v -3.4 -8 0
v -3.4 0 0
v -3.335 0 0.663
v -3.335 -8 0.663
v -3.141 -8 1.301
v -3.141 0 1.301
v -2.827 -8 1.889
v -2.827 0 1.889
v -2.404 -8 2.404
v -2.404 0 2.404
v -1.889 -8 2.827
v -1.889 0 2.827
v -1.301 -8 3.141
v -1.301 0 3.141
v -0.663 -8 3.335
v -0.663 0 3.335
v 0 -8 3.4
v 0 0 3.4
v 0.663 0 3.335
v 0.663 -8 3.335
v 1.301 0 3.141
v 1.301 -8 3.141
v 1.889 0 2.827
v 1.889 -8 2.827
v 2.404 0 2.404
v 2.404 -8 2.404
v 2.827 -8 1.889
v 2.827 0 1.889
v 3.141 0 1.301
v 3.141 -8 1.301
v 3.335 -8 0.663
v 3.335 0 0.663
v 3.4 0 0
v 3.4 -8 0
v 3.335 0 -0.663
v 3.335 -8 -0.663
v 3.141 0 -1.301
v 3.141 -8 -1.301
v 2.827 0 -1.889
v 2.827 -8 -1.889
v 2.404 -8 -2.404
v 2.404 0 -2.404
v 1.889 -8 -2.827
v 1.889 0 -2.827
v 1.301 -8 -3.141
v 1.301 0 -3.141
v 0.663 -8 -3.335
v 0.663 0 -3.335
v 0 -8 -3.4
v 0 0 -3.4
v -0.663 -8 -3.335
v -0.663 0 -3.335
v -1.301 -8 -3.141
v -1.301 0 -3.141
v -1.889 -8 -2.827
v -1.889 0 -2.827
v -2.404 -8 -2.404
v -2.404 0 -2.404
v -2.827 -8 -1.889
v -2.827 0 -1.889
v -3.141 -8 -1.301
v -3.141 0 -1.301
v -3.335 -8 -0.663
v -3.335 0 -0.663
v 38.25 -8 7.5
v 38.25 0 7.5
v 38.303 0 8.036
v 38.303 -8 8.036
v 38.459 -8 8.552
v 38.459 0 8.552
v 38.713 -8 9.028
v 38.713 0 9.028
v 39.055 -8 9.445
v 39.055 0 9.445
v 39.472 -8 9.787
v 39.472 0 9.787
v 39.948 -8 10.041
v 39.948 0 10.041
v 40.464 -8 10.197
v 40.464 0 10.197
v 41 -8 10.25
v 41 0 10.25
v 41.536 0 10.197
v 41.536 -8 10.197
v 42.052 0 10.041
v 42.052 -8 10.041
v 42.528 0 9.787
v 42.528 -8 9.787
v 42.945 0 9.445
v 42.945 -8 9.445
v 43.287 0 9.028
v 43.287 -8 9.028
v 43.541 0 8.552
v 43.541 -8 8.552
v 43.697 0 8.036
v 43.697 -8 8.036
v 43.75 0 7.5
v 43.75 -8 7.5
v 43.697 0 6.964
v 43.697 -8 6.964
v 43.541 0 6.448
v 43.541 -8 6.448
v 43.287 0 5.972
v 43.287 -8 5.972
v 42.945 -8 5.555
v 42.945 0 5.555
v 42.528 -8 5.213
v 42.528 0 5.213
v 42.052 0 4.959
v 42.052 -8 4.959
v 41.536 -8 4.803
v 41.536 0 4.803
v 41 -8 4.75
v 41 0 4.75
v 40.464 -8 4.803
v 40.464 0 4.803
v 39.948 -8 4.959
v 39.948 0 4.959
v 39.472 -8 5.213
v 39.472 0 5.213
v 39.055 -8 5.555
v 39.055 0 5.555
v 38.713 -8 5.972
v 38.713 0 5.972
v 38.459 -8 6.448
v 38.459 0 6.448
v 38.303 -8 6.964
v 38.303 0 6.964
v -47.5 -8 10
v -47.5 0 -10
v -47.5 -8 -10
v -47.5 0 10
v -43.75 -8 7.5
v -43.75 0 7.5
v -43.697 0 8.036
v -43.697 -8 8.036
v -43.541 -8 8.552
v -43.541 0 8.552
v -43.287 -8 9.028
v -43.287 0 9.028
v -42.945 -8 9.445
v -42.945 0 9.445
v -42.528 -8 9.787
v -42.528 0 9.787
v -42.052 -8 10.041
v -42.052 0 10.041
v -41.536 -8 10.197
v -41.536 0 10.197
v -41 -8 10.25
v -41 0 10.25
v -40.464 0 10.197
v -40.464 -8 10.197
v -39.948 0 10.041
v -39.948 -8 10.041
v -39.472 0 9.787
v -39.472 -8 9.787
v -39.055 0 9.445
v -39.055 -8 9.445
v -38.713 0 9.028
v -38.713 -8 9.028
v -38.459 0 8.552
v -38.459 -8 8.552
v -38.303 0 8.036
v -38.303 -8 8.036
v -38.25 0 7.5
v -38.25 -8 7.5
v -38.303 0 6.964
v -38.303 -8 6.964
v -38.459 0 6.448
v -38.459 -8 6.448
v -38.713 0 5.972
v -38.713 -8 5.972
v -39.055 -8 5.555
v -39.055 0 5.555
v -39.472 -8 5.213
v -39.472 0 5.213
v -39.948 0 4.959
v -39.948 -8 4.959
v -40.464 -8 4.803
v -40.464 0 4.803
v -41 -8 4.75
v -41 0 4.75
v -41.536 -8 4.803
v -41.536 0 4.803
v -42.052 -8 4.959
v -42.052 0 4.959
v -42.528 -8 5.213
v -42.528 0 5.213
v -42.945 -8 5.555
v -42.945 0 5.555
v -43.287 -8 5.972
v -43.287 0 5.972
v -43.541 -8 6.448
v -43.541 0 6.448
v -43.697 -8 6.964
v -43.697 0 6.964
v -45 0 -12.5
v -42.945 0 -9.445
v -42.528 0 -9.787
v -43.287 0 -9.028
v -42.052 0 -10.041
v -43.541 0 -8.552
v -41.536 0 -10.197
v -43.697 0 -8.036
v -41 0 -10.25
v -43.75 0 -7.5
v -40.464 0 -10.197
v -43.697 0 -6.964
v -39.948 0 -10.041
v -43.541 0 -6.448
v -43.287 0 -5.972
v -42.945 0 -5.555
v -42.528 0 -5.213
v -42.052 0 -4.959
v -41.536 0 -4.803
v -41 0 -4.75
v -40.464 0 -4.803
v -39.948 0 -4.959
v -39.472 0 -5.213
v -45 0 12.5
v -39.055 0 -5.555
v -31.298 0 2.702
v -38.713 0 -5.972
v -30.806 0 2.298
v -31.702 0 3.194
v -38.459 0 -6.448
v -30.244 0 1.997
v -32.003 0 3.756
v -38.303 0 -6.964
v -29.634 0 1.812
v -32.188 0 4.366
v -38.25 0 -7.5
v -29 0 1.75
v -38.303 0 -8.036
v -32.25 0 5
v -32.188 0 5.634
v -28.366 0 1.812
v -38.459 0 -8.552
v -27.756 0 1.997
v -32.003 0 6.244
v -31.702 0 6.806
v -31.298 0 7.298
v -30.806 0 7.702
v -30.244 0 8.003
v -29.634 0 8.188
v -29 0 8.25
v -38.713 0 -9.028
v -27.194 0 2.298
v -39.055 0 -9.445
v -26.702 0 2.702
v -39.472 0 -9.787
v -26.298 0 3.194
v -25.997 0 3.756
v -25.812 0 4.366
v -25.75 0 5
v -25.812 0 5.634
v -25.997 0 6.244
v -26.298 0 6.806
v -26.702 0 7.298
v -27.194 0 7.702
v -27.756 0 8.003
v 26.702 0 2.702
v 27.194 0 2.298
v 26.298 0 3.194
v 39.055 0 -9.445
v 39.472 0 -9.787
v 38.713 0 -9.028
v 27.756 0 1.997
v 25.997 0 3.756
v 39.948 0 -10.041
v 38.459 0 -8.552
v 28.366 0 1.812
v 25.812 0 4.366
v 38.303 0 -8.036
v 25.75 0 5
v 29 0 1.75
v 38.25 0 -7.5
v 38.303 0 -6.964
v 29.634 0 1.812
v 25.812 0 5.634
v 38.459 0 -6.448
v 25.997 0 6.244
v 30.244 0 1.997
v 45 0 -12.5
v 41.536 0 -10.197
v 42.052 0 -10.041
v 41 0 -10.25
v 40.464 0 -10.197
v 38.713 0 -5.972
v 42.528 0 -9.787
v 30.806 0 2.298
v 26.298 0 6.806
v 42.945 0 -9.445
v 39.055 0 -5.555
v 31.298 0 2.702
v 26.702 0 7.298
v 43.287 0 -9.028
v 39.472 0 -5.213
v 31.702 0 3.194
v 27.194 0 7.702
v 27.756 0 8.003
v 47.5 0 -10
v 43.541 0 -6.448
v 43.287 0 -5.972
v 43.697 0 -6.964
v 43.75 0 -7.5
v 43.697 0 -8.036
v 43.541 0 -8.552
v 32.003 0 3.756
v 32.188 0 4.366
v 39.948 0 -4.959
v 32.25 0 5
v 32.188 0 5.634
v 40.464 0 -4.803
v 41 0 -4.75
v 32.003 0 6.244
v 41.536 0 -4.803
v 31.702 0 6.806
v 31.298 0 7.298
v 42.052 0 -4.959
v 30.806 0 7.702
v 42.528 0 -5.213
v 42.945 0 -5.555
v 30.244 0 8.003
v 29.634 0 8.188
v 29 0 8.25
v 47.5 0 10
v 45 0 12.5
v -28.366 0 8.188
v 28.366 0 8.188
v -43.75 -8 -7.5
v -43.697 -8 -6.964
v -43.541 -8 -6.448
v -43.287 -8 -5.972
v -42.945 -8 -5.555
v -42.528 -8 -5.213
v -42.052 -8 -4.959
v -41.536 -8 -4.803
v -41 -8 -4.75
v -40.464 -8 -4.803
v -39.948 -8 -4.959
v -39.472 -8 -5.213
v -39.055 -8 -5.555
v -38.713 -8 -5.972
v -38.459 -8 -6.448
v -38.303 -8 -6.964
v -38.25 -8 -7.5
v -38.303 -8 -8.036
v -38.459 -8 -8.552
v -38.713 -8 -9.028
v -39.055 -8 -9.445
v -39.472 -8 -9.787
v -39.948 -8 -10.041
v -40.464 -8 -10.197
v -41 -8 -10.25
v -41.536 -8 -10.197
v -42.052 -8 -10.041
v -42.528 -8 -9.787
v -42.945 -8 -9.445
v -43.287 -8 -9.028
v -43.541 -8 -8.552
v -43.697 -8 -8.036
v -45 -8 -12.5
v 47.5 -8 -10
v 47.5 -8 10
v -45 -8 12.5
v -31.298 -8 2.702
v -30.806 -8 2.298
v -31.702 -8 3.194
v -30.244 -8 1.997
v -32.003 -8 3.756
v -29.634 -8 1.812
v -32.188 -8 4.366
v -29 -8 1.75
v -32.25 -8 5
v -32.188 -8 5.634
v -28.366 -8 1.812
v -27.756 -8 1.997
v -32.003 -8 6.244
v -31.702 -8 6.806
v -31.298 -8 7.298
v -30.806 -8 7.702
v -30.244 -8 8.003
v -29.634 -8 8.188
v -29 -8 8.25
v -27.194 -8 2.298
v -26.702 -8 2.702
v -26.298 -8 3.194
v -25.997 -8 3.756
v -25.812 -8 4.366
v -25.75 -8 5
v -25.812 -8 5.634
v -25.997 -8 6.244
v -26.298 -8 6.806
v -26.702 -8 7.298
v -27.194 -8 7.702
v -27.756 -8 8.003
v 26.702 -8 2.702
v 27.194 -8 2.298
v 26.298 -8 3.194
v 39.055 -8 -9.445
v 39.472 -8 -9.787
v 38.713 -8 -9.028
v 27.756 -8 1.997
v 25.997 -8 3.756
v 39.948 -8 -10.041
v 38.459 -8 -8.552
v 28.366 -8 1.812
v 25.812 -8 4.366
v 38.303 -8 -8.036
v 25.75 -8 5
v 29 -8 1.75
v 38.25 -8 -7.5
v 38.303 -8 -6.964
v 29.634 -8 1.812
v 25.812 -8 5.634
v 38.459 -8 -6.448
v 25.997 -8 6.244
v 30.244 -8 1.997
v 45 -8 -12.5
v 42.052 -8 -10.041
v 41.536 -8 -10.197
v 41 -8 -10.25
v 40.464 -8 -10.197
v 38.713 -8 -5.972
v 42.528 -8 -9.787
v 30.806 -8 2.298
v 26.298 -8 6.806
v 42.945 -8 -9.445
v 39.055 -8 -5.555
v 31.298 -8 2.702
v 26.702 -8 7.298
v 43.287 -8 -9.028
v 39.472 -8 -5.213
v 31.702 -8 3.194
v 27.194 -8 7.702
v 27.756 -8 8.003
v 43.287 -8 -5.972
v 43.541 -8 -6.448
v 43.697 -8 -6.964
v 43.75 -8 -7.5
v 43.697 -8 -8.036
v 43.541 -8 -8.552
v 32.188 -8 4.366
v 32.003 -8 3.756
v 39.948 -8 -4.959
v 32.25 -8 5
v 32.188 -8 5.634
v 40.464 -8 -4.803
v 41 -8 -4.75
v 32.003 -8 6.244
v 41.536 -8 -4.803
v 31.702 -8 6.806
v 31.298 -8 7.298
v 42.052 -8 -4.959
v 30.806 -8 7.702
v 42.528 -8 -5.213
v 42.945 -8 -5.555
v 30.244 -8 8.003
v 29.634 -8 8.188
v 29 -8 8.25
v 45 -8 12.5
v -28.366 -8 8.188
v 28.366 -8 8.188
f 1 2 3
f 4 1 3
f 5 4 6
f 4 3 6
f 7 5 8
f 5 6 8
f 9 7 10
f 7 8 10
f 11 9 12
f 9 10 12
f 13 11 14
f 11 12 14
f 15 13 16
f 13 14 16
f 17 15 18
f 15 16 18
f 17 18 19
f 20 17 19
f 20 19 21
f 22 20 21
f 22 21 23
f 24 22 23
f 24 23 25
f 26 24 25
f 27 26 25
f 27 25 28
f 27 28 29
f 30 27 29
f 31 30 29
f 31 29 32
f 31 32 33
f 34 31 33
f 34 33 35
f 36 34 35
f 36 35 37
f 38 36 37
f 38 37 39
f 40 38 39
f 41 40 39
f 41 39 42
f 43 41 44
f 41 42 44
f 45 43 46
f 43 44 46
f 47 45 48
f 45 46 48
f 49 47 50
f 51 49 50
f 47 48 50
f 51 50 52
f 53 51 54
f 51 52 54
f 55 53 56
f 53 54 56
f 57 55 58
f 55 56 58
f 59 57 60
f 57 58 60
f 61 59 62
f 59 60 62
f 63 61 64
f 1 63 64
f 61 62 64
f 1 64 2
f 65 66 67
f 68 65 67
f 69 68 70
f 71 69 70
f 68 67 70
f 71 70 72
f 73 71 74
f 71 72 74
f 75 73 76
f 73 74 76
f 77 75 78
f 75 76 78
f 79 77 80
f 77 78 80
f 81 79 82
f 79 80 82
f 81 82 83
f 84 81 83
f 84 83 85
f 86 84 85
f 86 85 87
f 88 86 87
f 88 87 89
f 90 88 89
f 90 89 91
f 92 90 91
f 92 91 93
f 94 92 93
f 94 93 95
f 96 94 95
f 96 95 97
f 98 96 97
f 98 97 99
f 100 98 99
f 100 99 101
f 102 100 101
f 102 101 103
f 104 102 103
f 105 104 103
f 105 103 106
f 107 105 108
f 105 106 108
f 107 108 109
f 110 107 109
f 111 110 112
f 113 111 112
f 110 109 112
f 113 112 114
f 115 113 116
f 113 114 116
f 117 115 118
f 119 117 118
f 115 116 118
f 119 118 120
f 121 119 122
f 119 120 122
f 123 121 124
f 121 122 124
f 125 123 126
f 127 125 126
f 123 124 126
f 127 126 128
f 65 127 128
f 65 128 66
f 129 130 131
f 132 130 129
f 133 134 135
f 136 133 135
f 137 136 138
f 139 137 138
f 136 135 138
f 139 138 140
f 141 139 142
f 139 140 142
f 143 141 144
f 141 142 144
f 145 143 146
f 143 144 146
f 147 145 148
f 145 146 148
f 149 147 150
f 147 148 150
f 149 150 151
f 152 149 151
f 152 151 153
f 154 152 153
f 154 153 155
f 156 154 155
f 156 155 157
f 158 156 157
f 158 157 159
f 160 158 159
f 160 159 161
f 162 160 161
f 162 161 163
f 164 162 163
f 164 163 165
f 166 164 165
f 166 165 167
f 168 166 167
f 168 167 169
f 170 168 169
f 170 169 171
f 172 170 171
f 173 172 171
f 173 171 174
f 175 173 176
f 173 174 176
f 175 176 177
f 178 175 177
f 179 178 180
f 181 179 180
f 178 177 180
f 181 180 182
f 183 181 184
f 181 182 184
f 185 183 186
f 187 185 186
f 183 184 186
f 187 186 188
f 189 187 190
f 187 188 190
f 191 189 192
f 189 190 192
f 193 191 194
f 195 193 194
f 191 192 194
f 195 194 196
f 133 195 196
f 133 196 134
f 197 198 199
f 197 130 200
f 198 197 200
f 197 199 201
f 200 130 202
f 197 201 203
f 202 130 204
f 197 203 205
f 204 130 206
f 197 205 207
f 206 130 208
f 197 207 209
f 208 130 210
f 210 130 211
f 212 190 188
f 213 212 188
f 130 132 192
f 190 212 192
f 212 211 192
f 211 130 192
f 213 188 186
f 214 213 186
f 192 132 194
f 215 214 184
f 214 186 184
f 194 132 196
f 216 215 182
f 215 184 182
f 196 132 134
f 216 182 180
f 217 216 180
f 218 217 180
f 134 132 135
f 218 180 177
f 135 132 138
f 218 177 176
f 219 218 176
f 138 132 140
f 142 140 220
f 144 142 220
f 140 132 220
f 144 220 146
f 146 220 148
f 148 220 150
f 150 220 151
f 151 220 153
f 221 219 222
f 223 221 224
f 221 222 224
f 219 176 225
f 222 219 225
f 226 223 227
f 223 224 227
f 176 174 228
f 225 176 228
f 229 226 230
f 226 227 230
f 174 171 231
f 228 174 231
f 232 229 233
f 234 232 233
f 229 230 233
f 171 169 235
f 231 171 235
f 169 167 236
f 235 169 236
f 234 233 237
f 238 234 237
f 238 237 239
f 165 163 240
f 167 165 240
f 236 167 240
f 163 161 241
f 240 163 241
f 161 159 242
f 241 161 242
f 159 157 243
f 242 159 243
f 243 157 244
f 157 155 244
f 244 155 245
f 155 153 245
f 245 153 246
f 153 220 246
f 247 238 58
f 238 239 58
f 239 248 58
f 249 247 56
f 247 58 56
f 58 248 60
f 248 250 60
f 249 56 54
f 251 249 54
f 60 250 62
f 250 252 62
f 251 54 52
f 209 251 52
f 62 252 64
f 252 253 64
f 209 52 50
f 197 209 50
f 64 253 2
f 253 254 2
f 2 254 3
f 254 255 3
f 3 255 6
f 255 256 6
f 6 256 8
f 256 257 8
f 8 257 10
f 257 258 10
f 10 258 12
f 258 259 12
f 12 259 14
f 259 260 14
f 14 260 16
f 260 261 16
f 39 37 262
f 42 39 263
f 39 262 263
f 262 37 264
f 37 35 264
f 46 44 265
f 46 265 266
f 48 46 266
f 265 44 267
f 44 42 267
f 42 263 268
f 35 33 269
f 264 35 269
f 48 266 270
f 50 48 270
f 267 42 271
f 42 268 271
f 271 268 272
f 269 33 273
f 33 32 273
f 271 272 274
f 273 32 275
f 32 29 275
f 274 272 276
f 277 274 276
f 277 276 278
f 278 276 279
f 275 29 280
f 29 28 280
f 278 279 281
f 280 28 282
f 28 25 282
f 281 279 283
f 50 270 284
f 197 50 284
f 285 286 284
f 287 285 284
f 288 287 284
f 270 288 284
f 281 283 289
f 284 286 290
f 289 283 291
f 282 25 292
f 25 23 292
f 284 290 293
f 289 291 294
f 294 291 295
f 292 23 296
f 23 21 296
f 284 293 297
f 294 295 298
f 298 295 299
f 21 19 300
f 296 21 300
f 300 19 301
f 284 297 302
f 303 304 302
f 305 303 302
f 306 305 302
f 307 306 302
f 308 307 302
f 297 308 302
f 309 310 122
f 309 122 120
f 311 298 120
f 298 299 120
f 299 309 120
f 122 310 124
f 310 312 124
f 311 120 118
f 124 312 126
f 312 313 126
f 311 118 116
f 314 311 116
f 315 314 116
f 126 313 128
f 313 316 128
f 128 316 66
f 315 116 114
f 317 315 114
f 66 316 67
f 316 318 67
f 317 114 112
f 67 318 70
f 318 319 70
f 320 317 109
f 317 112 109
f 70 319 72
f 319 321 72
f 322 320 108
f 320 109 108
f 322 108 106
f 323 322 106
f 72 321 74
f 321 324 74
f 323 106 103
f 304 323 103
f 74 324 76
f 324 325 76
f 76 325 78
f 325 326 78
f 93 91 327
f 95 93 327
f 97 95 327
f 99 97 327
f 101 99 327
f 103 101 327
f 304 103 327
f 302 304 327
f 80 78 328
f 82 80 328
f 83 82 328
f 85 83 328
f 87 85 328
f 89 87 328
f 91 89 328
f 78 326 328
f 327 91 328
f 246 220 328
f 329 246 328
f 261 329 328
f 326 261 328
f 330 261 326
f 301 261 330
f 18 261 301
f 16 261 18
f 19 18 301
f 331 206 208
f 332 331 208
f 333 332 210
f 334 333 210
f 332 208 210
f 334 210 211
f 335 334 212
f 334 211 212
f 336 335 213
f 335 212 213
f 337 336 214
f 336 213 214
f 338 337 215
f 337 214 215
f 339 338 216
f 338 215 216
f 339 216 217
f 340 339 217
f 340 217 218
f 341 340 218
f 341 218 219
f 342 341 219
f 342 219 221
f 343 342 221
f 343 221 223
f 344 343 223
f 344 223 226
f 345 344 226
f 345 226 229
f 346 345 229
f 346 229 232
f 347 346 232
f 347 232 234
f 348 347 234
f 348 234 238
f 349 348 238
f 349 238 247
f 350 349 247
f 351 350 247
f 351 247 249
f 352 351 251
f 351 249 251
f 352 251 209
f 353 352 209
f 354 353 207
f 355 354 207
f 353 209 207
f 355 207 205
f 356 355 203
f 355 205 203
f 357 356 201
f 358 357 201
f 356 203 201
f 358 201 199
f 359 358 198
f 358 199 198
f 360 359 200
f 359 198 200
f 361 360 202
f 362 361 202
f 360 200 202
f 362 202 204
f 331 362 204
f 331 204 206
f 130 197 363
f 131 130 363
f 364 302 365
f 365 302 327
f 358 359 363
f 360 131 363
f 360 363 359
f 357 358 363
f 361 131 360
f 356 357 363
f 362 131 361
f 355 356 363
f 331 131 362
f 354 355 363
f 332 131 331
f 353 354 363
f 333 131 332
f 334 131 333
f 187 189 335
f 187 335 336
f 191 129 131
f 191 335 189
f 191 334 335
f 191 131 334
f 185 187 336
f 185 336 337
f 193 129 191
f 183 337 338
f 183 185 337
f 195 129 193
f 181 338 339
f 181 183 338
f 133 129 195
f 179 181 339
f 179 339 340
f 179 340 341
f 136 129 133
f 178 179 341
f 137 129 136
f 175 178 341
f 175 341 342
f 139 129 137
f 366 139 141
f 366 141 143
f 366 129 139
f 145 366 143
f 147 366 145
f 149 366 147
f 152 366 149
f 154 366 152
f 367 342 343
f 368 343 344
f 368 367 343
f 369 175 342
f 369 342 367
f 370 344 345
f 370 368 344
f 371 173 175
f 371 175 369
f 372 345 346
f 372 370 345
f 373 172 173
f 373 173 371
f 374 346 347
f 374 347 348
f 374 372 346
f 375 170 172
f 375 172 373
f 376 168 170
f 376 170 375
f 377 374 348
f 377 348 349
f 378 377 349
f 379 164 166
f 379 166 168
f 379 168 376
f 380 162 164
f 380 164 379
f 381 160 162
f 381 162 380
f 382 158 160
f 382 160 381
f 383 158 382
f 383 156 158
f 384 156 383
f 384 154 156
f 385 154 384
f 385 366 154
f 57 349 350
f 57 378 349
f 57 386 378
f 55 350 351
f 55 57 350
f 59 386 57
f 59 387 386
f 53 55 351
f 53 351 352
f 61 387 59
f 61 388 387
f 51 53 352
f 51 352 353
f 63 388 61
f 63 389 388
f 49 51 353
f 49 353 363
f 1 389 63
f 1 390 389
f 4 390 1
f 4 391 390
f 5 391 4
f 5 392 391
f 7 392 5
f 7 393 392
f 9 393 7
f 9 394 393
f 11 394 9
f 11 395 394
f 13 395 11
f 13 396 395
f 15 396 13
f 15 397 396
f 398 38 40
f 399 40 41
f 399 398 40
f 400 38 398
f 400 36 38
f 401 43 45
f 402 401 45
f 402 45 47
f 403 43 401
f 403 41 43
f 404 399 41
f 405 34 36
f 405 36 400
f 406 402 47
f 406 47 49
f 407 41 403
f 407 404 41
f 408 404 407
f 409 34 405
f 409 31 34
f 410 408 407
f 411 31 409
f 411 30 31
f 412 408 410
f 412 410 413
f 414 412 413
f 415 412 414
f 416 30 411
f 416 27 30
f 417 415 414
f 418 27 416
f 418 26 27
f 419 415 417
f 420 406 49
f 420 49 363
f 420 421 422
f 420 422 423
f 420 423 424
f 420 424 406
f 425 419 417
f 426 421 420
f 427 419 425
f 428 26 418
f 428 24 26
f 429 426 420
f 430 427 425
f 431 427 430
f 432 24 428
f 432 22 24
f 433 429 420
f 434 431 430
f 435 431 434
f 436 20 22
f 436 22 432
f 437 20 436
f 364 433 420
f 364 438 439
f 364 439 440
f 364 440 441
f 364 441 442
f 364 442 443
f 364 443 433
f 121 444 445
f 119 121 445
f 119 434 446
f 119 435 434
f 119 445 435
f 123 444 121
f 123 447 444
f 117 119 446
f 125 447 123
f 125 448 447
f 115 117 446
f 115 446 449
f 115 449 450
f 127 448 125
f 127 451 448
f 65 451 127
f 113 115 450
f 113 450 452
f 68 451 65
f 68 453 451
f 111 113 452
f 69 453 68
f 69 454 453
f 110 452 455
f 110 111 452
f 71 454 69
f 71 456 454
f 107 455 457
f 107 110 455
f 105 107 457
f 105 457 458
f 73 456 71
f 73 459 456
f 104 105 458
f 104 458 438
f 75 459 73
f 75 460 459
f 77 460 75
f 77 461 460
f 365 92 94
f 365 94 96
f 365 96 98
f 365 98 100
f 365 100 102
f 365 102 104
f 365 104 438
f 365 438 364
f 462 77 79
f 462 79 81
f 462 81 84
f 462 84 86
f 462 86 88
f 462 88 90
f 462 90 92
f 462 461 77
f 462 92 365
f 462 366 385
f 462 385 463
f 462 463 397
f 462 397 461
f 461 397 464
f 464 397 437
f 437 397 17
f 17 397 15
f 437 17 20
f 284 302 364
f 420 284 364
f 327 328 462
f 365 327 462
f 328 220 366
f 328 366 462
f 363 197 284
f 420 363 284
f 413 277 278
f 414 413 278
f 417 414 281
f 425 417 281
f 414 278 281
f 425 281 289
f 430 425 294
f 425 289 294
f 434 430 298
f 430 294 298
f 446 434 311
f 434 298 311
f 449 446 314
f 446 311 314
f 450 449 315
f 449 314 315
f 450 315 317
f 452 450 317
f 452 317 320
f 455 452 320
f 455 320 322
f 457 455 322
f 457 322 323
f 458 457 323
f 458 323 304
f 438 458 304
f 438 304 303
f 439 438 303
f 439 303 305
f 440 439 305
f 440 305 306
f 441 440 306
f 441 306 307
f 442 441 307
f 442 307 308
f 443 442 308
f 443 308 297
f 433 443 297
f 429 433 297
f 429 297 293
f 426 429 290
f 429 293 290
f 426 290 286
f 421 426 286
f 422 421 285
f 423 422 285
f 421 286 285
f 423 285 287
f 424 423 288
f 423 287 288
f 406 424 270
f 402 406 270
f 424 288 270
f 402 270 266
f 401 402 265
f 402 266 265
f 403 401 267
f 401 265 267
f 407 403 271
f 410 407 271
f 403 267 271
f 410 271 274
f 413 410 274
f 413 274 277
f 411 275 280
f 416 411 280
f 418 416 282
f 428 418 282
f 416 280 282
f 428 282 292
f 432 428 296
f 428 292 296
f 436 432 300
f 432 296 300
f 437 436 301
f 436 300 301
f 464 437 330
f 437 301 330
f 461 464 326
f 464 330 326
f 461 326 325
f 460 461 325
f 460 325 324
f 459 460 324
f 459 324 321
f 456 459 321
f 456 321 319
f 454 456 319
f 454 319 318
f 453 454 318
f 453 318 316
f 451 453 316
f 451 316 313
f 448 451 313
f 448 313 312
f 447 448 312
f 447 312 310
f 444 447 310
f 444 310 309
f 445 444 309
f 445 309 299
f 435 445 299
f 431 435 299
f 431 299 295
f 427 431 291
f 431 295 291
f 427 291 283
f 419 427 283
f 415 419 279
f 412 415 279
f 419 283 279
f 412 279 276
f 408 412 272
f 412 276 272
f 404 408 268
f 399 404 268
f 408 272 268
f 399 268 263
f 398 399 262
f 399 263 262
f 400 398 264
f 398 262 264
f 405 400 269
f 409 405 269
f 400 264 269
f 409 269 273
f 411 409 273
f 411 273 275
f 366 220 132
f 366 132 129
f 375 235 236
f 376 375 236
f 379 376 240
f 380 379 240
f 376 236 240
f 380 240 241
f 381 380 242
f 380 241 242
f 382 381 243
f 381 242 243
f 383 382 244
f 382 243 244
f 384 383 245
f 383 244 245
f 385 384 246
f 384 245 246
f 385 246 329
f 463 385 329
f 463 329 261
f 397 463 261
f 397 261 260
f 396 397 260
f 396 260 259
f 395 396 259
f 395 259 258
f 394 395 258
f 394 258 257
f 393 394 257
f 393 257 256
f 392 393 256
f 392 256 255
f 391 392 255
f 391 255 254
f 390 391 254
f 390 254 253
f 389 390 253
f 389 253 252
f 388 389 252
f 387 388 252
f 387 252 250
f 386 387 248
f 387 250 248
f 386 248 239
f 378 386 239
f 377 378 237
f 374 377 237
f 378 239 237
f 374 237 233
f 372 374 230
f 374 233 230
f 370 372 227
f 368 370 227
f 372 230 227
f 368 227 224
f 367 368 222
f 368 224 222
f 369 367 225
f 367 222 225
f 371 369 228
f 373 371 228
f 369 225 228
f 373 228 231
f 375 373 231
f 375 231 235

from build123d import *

# Parameters (mm, degrees)
F0_W     = 95
F0_H     = 25
F1_DEPTH = 8
F2_SIZE  = 2.5
F4_D     = 5.5
F4_DEPTH = 10
F4_TIP   = 1.6523667023
F6_D     = 6.5
F6_DEPTH = 10
F6_TIP   = 1.9527970118
F7_D     = 6.8


with BuildPart() as f1:
    # F0 (on Front) → F1 (new body)
    with BuildSketch(Plane.XZ):
        Rectangle(F0_W, F0_H)
    extrude(amount=F1_DEPTH)

    # F2
    f2_edges = [f1.edges().sort_by_distance(p)[0] for p in [
        (47.5, -4, 12.5),
        (47.5, -4, -12.5),
        (-47.5, -4, 12.5),
        (-47.5, -4, -12.5),
    ]]
    chamfer(f2_edges, length=F2_SIZE)

    # F4
    with Locations(Plane.XZ.offset(8)):
        with Locations((-41, 7.5), (-41, -7.5), (41, -7.5), (41, 7.5)):
            Hole(F4_D / 2, depth=F4_DEPTH)
            with Locations((0, 0, -(F4_DEPTH + F4_TIP / 2))):  # 118° drill point
                Cone(0, F4_D / 2, F4_TIP, mode=Mode.SUBTRACT)

    # F6
    with Locations(Plane.XZ.offset(8)):
        with Locations((-29, 5), (29, 5)):
            Hole(F6_D / 2, depth=F6_DEPTH)
            with Locations((0, 0, -(F6_DEPTH + F6_TIP / 2))):  # 118° drill point
                Cone(0, F6_D / 2, F6_TIP, mode=Mode.SUBTRACT)

    # F7 (through all)
    with Locations(Plane.XZ.offset(8)):
        with Locations((0, 0)):
            Hole(F7_D / 2)


solid = f1.part
